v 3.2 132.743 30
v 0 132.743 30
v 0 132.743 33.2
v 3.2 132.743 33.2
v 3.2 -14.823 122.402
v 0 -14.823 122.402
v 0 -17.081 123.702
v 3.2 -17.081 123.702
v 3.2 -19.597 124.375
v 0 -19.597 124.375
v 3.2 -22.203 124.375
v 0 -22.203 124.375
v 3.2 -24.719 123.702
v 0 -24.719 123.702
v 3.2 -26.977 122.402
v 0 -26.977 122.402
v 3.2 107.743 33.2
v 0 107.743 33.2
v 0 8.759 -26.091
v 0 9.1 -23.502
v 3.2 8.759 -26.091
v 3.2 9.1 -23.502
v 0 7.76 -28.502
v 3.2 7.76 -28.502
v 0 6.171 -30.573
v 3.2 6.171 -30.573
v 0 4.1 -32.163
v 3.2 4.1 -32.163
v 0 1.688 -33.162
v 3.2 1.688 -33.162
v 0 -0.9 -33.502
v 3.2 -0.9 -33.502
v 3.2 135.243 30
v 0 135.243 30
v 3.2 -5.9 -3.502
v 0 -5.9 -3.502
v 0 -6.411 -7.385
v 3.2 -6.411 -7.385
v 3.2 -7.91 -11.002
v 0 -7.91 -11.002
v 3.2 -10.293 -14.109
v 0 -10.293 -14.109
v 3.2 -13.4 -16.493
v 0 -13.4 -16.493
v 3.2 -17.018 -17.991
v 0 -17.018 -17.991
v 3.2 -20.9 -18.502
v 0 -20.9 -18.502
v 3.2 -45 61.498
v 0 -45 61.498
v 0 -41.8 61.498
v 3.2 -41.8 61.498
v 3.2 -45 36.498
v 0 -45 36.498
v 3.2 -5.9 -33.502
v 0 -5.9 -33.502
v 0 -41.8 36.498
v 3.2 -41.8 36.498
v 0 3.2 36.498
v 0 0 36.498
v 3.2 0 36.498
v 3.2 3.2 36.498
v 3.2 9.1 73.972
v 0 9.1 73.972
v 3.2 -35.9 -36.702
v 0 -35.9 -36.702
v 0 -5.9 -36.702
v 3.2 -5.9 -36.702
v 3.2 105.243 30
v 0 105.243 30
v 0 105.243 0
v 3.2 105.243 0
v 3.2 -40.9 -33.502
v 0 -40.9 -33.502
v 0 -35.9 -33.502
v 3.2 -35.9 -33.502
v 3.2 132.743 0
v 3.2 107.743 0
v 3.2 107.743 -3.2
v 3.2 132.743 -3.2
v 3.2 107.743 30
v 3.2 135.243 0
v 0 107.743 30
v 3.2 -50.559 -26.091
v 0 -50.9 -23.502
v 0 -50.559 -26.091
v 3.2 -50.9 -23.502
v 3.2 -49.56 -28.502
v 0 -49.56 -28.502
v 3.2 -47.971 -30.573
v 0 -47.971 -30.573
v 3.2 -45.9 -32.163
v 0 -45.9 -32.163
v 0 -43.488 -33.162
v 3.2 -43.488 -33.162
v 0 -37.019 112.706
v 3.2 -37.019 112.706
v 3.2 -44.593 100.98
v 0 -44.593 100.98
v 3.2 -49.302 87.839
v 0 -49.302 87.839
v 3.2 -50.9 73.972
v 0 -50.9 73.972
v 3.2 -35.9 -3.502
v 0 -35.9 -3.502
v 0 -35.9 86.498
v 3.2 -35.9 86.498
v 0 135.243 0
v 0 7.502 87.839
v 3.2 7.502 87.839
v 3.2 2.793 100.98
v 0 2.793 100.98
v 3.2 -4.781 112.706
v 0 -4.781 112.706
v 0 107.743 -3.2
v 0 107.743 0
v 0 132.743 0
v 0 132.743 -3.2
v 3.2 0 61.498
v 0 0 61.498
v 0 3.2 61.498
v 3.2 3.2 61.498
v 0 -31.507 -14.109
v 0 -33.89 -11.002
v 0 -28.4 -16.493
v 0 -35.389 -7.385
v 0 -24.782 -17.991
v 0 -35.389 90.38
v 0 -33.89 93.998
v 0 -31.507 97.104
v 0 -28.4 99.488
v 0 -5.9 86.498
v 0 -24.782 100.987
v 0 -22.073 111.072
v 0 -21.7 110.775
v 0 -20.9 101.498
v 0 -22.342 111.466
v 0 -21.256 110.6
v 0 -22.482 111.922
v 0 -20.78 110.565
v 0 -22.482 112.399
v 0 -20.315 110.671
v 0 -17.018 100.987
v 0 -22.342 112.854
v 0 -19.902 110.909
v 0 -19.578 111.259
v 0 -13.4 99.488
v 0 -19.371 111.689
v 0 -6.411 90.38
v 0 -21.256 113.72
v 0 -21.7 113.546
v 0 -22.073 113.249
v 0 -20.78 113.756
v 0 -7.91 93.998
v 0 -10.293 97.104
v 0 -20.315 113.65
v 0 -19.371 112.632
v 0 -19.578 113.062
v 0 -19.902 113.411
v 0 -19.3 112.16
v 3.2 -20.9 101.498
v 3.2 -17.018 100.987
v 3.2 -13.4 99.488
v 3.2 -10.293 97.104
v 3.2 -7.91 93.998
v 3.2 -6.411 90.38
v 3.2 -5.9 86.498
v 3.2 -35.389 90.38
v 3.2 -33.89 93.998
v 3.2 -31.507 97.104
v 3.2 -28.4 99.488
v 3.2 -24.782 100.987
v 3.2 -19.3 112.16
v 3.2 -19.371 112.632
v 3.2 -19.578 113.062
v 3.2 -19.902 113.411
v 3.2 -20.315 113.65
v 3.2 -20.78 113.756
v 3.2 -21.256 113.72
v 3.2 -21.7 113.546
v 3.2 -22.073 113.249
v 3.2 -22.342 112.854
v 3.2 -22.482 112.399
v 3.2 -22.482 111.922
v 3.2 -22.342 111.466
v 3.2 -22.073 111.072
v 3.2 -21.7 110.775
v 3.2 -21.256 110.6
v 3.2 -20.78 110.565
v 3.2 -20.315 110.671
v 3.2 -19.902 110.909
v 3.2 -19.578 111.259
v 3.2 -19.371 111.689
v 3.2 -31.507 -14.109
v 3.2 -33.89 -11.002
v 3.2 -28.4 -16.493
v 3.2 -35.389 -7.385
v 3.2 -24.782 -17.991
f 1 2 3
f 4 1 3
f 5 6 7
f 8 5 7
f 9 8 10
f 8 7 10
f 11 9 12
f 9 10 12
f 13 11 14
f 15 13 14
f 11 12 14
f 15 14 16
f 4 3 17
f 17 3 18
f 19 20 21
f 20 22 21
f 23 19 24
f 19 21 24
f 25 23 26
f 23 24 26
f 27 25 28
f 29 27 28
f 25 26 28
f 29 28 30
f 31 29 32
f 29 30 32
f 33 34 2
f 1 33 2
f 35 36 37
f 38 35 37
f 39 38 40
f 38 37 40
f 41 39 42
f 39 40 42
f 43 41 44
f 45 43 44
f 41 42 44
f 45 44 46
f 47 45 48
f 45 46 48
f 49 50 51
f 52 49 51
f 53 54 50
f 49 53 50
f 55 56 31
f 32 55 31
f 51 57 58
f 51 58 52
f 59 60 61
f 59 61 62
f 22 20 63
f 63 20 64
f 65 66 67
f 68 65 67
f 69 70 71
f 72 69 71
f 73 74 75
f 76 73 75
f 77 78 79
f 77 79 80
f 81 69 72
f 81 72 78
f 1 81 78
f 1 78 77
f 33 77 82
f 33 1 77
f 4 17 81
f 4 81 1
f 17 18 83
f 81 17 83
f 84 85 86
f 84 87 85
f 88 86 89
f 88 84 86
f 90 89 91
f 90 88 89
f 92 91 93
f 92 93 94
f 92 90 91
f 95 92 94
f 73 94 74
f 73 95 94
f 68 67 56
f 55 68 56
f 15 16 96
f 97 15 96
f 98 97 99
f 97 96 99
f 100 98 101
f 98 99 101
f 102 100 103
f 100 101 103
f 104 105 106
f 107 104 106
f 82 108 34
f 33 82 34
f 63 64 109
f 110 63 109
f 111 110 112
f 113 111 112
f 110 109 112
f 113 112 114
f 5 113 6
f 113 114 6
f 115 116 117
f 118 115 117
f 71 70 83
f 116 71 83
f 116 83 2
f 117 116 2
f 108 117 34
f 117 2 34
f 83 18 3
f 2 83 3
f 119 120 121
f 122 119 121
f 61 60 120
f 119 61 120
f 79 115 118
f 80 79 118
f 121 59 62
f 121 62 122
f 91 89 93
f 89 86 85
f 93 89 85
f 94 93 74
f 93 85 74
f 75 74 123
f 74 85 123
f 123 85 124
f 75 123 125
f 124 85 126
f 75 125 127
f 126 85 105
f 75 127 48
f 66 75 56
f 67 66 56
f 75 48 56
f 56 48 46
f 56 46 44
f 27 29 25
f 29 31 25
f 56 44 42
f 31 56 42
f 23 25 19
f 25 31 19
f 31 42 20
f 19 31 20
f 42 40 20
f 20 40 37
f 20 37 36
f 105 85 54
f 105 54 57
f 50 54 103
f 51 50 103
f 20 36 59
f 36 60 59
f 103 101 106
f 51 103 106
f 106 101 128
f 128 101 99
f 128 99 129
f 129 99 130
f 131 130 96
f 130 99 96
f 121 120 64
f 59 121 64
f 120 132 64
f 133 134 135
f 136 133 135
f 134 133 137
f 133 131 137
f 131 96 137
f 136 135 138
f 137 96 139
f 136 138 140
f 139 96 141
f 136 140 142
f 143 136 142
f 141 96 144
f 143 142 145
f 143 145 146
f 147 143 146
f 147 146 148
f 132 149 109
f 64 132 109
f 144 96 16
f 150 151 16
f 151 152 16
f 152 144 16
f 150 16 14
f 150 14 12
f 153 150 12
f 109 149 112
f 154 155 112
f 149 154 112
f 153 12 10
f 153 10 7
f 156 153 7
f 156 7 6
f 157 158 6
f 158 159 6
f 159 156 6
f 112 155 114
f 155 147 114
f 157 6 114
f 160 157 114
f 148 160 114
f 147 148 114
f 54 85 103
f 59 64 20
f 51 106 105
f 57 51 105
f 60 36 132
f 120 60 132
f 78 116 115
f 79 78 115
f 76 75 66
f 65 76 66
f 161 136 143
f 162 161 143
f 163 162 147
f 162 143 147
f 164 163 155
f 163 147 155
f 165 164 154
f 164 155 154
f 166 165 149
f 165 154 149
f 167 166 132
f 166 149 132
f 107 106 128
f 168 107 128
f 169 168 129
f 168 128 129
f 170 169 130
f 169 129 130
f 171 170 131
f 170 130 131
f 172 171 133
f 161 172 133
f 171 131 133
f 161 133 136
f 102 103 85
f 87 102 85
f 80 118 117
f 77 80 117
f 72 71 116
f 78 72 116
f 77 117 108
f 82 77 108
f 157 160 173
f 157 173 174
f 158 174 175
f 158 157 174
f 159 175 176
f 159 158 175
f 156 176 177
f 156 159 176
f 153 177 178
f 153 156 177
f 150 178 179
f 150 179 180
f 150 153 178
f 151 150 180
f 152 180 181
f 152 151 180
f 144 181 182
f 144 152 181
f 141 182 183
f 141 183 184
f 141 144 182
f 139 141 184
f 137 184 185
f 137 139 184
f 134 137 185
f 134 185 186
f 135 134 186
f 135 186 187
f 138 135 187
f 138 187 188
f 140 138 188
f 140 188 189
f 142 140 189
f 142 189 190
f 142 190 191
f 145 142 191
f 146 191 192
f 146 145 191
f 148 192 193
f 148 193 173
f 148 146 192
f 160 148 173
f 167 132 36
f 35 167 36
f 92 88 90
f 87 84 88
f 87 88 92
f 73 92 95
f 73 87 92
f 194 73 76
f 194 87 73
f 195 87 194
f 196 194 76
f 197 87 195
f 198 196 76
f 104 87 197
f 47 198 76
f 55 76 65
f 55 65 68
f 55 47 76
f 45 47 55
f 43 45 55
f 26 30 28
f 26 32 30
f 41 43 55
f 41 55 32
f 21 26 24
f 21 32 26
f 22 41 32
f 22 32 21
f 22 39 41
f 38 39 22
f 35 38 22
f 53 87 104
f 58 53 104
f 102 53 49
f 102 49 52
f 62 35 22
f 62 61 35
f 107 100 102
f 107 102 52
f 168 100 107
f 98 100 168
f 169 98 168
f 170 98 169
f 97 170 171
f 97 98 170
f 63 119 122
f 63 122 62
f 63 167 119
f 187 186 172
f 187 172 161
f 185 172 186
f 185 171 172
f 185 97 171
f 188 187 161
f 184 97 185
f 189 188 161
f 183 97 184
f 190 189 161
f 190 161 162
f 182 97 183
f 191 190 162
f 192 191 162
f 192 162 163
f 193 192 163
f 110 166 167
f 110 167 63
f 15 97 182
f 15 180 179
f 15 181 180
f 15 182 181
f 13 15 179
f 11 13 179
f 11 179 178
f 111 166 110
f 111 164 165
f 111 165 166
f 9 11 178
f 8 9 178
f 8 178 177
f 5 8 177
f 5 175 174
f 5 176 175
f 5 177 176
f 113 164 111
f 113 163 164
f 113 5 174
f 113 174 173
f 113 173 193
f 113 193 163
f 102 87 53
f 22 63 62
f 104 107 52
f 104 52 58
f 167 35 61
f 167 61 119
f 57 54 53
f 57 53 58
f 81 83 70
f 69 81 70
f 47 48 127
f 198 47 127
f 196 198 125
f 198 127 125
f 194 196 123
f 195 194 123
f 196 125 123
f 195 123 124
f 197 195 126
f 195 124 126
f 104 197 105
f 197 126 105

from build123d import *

# Parameters (mm, degrees)
F0_W     = 3.2
F0_H     = 25
F0_R     = 1.6
F1_DEPTH = 3.2
F2_R     = 10


with BuildPart() as f1:
    # F0 (on Right) → F1 (new body)
    with BuildSketch(Plane.YZ):
        with BuildLine():
            Line((-50.9, 73.971951), (-50.9, -33.502359))
            Line((-50.9, -33.502359), (-35.9, -33.502359))
            Line((-35.9, -33.502359), (-35.9, -36.702359))
            Line((-35.9, -36.702359), (-5.9, -36.702359))
            Line((-5.9, -36.702359), (-5.9, -33.502359))
            Line((-5.9, -33.502359), (9.1, -33.502359))
            Line((9.1, -33.502359), (9.1, 73.971951))
            ThreePointArc((9.1, 73.971951), (2.79314, 100.980084), (-14.822917, 122.401809))
            ThreePointArc((-14.822917, 122.401809), (-20.9, 124.460206), (-26.977083, 122.401809))
            ThreePointArc((-26.977083, 122.401809), (-44.59314, 100.980084), (-50.9, 73.971951))
        make_face()
        with BuildLine():
            Line((-35.9, -3.502359), (-35.9, 86.497641))
            ThreePointArc((-35.9, 86.497641), (-31.506602, 97.104243), (-20.9, 101.497641))
            ThreePointArc((-20.9, 101.497641), (-10.293398, 97.104243), (-5.9, 86.497641))
            Line((-5.9, 86.497641), (-5.9, -3.502359))
            ThreePointArc((-5.9, -3.502359), (-10.293398, -14.108961), (-20.9, -18.502359))
            ThreePointArc((-20.9, -18.502359), (-31.506602, -14.108961), (-35.9, -3.502359))
        make_face(mode=Mode.SUBTRACT)
        with Locations((-43.4, 48.997641)):
            Rectangle(F0_W, F0_H, mode=Mode.SUBTRACT)
        with Locations((1.6, 48.997641)):
            Rectangle(F0_W, F0_H, mode=Mode.SUBTRACT)
        with Locations((-20.9, 112.160236)):
            Circle(F0_R, mode=Mode.SUBTRACT)
        Polygon((107.742983, 30), (105.242983, 30), (105.242983, 0), (107.742983, 0), (107.742983, -3.2), (132.742983, -3.2), (132.742983, 0), (135.242983, 0), (135.242983, 30), (132.742983, 30), (132.742983, 33.2), (107.742983, 33.2), align=None)
    extrude(amount=F1_DEPTH)

    # F2
    f2_edges = [f1.edges().sort_by_distance(p)[0] for p in [
        (1.6, -50.9, -33.502359),
        (1.6, 9.1, -33.502359),
    ]]
    fillet(f2_edges, radius=F2_R)


solid = f1.part
